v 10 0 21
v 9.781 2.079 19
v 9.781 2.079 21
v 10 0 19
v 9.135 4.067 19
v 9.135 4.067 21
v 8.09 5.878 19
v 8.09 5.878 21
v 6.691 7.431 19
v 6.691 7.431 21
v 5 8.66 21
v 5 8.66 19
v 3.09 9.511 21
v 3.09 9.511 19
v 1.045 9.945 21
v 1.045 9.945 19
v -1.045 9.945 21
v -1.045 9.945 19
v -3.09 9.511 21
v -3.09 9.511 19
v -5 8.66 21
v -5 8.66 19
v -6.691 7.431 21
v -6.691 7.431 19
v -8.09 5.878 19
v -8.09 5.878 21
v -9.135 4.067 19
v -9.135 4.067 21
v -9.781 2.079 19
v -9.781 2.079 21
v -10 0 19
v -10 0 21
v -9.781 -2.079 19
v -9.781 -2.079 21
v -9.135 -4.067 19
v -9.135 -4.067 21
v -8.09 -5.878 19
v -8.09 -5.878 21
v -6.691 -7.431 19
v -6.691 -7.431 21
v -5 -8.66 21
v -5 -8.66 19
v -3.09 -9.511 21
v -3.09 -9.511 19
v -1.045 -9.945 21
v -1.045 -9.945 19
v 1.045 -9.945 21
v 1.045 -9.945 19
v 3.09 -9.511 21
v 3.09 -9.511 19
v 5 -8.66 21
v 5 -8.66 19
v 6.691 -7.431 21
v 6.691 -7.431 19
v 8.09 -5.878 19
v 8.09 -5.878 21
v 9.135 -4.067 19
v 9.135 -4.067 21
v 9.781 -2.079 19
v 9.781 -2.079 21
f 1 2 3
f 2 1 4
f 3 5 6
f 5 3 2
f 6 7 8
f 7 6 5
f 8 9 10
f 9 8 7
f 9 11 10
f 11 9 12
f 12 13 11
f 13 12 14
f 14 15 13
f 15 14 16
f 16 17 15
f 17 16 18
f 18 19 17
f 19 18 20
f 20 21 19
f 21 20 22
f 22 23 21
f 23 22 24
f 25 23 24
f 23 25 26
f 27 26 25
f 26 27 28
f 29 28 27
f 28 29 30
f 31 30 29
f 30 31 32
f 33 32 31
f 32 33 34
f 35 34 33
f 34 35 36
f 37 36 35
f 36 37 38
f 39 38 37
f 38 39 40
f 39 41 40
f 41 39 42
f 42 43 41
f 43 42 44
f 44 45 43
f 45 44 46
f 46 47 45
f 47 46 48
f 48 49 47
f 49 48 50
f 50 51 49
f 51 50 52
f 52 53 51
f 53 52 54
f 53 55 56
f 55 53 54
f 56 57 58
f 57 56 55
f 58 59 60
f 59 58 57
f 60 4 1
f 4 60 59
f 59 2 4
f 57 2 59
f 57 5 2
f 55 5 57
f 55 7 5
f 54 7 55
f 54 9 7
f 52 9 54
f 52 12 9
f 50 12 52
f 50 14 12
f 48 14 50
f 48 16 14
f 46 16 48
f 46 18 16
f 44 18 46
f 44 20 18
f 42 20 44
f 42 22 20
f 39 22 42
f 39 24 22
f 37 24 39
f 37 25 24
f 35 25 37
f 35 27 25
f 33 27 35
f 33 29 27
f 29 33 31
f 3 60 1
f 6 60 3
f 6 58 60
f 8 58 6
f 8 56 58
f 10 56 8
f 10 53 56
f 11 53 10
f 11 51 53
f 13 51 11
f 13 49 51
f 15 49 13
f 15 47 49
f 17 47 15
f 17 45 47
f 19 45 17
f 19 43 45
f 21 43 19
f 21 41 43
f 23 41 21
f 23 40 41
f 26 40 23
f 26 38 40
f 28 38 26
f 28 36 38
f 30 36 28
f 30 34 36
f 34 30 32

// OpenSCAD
module topPart(top,wid,height){
	translate([0,0,20])
		cylinder(top,wid,height,center=true);
}
topPart(2,10,10);
